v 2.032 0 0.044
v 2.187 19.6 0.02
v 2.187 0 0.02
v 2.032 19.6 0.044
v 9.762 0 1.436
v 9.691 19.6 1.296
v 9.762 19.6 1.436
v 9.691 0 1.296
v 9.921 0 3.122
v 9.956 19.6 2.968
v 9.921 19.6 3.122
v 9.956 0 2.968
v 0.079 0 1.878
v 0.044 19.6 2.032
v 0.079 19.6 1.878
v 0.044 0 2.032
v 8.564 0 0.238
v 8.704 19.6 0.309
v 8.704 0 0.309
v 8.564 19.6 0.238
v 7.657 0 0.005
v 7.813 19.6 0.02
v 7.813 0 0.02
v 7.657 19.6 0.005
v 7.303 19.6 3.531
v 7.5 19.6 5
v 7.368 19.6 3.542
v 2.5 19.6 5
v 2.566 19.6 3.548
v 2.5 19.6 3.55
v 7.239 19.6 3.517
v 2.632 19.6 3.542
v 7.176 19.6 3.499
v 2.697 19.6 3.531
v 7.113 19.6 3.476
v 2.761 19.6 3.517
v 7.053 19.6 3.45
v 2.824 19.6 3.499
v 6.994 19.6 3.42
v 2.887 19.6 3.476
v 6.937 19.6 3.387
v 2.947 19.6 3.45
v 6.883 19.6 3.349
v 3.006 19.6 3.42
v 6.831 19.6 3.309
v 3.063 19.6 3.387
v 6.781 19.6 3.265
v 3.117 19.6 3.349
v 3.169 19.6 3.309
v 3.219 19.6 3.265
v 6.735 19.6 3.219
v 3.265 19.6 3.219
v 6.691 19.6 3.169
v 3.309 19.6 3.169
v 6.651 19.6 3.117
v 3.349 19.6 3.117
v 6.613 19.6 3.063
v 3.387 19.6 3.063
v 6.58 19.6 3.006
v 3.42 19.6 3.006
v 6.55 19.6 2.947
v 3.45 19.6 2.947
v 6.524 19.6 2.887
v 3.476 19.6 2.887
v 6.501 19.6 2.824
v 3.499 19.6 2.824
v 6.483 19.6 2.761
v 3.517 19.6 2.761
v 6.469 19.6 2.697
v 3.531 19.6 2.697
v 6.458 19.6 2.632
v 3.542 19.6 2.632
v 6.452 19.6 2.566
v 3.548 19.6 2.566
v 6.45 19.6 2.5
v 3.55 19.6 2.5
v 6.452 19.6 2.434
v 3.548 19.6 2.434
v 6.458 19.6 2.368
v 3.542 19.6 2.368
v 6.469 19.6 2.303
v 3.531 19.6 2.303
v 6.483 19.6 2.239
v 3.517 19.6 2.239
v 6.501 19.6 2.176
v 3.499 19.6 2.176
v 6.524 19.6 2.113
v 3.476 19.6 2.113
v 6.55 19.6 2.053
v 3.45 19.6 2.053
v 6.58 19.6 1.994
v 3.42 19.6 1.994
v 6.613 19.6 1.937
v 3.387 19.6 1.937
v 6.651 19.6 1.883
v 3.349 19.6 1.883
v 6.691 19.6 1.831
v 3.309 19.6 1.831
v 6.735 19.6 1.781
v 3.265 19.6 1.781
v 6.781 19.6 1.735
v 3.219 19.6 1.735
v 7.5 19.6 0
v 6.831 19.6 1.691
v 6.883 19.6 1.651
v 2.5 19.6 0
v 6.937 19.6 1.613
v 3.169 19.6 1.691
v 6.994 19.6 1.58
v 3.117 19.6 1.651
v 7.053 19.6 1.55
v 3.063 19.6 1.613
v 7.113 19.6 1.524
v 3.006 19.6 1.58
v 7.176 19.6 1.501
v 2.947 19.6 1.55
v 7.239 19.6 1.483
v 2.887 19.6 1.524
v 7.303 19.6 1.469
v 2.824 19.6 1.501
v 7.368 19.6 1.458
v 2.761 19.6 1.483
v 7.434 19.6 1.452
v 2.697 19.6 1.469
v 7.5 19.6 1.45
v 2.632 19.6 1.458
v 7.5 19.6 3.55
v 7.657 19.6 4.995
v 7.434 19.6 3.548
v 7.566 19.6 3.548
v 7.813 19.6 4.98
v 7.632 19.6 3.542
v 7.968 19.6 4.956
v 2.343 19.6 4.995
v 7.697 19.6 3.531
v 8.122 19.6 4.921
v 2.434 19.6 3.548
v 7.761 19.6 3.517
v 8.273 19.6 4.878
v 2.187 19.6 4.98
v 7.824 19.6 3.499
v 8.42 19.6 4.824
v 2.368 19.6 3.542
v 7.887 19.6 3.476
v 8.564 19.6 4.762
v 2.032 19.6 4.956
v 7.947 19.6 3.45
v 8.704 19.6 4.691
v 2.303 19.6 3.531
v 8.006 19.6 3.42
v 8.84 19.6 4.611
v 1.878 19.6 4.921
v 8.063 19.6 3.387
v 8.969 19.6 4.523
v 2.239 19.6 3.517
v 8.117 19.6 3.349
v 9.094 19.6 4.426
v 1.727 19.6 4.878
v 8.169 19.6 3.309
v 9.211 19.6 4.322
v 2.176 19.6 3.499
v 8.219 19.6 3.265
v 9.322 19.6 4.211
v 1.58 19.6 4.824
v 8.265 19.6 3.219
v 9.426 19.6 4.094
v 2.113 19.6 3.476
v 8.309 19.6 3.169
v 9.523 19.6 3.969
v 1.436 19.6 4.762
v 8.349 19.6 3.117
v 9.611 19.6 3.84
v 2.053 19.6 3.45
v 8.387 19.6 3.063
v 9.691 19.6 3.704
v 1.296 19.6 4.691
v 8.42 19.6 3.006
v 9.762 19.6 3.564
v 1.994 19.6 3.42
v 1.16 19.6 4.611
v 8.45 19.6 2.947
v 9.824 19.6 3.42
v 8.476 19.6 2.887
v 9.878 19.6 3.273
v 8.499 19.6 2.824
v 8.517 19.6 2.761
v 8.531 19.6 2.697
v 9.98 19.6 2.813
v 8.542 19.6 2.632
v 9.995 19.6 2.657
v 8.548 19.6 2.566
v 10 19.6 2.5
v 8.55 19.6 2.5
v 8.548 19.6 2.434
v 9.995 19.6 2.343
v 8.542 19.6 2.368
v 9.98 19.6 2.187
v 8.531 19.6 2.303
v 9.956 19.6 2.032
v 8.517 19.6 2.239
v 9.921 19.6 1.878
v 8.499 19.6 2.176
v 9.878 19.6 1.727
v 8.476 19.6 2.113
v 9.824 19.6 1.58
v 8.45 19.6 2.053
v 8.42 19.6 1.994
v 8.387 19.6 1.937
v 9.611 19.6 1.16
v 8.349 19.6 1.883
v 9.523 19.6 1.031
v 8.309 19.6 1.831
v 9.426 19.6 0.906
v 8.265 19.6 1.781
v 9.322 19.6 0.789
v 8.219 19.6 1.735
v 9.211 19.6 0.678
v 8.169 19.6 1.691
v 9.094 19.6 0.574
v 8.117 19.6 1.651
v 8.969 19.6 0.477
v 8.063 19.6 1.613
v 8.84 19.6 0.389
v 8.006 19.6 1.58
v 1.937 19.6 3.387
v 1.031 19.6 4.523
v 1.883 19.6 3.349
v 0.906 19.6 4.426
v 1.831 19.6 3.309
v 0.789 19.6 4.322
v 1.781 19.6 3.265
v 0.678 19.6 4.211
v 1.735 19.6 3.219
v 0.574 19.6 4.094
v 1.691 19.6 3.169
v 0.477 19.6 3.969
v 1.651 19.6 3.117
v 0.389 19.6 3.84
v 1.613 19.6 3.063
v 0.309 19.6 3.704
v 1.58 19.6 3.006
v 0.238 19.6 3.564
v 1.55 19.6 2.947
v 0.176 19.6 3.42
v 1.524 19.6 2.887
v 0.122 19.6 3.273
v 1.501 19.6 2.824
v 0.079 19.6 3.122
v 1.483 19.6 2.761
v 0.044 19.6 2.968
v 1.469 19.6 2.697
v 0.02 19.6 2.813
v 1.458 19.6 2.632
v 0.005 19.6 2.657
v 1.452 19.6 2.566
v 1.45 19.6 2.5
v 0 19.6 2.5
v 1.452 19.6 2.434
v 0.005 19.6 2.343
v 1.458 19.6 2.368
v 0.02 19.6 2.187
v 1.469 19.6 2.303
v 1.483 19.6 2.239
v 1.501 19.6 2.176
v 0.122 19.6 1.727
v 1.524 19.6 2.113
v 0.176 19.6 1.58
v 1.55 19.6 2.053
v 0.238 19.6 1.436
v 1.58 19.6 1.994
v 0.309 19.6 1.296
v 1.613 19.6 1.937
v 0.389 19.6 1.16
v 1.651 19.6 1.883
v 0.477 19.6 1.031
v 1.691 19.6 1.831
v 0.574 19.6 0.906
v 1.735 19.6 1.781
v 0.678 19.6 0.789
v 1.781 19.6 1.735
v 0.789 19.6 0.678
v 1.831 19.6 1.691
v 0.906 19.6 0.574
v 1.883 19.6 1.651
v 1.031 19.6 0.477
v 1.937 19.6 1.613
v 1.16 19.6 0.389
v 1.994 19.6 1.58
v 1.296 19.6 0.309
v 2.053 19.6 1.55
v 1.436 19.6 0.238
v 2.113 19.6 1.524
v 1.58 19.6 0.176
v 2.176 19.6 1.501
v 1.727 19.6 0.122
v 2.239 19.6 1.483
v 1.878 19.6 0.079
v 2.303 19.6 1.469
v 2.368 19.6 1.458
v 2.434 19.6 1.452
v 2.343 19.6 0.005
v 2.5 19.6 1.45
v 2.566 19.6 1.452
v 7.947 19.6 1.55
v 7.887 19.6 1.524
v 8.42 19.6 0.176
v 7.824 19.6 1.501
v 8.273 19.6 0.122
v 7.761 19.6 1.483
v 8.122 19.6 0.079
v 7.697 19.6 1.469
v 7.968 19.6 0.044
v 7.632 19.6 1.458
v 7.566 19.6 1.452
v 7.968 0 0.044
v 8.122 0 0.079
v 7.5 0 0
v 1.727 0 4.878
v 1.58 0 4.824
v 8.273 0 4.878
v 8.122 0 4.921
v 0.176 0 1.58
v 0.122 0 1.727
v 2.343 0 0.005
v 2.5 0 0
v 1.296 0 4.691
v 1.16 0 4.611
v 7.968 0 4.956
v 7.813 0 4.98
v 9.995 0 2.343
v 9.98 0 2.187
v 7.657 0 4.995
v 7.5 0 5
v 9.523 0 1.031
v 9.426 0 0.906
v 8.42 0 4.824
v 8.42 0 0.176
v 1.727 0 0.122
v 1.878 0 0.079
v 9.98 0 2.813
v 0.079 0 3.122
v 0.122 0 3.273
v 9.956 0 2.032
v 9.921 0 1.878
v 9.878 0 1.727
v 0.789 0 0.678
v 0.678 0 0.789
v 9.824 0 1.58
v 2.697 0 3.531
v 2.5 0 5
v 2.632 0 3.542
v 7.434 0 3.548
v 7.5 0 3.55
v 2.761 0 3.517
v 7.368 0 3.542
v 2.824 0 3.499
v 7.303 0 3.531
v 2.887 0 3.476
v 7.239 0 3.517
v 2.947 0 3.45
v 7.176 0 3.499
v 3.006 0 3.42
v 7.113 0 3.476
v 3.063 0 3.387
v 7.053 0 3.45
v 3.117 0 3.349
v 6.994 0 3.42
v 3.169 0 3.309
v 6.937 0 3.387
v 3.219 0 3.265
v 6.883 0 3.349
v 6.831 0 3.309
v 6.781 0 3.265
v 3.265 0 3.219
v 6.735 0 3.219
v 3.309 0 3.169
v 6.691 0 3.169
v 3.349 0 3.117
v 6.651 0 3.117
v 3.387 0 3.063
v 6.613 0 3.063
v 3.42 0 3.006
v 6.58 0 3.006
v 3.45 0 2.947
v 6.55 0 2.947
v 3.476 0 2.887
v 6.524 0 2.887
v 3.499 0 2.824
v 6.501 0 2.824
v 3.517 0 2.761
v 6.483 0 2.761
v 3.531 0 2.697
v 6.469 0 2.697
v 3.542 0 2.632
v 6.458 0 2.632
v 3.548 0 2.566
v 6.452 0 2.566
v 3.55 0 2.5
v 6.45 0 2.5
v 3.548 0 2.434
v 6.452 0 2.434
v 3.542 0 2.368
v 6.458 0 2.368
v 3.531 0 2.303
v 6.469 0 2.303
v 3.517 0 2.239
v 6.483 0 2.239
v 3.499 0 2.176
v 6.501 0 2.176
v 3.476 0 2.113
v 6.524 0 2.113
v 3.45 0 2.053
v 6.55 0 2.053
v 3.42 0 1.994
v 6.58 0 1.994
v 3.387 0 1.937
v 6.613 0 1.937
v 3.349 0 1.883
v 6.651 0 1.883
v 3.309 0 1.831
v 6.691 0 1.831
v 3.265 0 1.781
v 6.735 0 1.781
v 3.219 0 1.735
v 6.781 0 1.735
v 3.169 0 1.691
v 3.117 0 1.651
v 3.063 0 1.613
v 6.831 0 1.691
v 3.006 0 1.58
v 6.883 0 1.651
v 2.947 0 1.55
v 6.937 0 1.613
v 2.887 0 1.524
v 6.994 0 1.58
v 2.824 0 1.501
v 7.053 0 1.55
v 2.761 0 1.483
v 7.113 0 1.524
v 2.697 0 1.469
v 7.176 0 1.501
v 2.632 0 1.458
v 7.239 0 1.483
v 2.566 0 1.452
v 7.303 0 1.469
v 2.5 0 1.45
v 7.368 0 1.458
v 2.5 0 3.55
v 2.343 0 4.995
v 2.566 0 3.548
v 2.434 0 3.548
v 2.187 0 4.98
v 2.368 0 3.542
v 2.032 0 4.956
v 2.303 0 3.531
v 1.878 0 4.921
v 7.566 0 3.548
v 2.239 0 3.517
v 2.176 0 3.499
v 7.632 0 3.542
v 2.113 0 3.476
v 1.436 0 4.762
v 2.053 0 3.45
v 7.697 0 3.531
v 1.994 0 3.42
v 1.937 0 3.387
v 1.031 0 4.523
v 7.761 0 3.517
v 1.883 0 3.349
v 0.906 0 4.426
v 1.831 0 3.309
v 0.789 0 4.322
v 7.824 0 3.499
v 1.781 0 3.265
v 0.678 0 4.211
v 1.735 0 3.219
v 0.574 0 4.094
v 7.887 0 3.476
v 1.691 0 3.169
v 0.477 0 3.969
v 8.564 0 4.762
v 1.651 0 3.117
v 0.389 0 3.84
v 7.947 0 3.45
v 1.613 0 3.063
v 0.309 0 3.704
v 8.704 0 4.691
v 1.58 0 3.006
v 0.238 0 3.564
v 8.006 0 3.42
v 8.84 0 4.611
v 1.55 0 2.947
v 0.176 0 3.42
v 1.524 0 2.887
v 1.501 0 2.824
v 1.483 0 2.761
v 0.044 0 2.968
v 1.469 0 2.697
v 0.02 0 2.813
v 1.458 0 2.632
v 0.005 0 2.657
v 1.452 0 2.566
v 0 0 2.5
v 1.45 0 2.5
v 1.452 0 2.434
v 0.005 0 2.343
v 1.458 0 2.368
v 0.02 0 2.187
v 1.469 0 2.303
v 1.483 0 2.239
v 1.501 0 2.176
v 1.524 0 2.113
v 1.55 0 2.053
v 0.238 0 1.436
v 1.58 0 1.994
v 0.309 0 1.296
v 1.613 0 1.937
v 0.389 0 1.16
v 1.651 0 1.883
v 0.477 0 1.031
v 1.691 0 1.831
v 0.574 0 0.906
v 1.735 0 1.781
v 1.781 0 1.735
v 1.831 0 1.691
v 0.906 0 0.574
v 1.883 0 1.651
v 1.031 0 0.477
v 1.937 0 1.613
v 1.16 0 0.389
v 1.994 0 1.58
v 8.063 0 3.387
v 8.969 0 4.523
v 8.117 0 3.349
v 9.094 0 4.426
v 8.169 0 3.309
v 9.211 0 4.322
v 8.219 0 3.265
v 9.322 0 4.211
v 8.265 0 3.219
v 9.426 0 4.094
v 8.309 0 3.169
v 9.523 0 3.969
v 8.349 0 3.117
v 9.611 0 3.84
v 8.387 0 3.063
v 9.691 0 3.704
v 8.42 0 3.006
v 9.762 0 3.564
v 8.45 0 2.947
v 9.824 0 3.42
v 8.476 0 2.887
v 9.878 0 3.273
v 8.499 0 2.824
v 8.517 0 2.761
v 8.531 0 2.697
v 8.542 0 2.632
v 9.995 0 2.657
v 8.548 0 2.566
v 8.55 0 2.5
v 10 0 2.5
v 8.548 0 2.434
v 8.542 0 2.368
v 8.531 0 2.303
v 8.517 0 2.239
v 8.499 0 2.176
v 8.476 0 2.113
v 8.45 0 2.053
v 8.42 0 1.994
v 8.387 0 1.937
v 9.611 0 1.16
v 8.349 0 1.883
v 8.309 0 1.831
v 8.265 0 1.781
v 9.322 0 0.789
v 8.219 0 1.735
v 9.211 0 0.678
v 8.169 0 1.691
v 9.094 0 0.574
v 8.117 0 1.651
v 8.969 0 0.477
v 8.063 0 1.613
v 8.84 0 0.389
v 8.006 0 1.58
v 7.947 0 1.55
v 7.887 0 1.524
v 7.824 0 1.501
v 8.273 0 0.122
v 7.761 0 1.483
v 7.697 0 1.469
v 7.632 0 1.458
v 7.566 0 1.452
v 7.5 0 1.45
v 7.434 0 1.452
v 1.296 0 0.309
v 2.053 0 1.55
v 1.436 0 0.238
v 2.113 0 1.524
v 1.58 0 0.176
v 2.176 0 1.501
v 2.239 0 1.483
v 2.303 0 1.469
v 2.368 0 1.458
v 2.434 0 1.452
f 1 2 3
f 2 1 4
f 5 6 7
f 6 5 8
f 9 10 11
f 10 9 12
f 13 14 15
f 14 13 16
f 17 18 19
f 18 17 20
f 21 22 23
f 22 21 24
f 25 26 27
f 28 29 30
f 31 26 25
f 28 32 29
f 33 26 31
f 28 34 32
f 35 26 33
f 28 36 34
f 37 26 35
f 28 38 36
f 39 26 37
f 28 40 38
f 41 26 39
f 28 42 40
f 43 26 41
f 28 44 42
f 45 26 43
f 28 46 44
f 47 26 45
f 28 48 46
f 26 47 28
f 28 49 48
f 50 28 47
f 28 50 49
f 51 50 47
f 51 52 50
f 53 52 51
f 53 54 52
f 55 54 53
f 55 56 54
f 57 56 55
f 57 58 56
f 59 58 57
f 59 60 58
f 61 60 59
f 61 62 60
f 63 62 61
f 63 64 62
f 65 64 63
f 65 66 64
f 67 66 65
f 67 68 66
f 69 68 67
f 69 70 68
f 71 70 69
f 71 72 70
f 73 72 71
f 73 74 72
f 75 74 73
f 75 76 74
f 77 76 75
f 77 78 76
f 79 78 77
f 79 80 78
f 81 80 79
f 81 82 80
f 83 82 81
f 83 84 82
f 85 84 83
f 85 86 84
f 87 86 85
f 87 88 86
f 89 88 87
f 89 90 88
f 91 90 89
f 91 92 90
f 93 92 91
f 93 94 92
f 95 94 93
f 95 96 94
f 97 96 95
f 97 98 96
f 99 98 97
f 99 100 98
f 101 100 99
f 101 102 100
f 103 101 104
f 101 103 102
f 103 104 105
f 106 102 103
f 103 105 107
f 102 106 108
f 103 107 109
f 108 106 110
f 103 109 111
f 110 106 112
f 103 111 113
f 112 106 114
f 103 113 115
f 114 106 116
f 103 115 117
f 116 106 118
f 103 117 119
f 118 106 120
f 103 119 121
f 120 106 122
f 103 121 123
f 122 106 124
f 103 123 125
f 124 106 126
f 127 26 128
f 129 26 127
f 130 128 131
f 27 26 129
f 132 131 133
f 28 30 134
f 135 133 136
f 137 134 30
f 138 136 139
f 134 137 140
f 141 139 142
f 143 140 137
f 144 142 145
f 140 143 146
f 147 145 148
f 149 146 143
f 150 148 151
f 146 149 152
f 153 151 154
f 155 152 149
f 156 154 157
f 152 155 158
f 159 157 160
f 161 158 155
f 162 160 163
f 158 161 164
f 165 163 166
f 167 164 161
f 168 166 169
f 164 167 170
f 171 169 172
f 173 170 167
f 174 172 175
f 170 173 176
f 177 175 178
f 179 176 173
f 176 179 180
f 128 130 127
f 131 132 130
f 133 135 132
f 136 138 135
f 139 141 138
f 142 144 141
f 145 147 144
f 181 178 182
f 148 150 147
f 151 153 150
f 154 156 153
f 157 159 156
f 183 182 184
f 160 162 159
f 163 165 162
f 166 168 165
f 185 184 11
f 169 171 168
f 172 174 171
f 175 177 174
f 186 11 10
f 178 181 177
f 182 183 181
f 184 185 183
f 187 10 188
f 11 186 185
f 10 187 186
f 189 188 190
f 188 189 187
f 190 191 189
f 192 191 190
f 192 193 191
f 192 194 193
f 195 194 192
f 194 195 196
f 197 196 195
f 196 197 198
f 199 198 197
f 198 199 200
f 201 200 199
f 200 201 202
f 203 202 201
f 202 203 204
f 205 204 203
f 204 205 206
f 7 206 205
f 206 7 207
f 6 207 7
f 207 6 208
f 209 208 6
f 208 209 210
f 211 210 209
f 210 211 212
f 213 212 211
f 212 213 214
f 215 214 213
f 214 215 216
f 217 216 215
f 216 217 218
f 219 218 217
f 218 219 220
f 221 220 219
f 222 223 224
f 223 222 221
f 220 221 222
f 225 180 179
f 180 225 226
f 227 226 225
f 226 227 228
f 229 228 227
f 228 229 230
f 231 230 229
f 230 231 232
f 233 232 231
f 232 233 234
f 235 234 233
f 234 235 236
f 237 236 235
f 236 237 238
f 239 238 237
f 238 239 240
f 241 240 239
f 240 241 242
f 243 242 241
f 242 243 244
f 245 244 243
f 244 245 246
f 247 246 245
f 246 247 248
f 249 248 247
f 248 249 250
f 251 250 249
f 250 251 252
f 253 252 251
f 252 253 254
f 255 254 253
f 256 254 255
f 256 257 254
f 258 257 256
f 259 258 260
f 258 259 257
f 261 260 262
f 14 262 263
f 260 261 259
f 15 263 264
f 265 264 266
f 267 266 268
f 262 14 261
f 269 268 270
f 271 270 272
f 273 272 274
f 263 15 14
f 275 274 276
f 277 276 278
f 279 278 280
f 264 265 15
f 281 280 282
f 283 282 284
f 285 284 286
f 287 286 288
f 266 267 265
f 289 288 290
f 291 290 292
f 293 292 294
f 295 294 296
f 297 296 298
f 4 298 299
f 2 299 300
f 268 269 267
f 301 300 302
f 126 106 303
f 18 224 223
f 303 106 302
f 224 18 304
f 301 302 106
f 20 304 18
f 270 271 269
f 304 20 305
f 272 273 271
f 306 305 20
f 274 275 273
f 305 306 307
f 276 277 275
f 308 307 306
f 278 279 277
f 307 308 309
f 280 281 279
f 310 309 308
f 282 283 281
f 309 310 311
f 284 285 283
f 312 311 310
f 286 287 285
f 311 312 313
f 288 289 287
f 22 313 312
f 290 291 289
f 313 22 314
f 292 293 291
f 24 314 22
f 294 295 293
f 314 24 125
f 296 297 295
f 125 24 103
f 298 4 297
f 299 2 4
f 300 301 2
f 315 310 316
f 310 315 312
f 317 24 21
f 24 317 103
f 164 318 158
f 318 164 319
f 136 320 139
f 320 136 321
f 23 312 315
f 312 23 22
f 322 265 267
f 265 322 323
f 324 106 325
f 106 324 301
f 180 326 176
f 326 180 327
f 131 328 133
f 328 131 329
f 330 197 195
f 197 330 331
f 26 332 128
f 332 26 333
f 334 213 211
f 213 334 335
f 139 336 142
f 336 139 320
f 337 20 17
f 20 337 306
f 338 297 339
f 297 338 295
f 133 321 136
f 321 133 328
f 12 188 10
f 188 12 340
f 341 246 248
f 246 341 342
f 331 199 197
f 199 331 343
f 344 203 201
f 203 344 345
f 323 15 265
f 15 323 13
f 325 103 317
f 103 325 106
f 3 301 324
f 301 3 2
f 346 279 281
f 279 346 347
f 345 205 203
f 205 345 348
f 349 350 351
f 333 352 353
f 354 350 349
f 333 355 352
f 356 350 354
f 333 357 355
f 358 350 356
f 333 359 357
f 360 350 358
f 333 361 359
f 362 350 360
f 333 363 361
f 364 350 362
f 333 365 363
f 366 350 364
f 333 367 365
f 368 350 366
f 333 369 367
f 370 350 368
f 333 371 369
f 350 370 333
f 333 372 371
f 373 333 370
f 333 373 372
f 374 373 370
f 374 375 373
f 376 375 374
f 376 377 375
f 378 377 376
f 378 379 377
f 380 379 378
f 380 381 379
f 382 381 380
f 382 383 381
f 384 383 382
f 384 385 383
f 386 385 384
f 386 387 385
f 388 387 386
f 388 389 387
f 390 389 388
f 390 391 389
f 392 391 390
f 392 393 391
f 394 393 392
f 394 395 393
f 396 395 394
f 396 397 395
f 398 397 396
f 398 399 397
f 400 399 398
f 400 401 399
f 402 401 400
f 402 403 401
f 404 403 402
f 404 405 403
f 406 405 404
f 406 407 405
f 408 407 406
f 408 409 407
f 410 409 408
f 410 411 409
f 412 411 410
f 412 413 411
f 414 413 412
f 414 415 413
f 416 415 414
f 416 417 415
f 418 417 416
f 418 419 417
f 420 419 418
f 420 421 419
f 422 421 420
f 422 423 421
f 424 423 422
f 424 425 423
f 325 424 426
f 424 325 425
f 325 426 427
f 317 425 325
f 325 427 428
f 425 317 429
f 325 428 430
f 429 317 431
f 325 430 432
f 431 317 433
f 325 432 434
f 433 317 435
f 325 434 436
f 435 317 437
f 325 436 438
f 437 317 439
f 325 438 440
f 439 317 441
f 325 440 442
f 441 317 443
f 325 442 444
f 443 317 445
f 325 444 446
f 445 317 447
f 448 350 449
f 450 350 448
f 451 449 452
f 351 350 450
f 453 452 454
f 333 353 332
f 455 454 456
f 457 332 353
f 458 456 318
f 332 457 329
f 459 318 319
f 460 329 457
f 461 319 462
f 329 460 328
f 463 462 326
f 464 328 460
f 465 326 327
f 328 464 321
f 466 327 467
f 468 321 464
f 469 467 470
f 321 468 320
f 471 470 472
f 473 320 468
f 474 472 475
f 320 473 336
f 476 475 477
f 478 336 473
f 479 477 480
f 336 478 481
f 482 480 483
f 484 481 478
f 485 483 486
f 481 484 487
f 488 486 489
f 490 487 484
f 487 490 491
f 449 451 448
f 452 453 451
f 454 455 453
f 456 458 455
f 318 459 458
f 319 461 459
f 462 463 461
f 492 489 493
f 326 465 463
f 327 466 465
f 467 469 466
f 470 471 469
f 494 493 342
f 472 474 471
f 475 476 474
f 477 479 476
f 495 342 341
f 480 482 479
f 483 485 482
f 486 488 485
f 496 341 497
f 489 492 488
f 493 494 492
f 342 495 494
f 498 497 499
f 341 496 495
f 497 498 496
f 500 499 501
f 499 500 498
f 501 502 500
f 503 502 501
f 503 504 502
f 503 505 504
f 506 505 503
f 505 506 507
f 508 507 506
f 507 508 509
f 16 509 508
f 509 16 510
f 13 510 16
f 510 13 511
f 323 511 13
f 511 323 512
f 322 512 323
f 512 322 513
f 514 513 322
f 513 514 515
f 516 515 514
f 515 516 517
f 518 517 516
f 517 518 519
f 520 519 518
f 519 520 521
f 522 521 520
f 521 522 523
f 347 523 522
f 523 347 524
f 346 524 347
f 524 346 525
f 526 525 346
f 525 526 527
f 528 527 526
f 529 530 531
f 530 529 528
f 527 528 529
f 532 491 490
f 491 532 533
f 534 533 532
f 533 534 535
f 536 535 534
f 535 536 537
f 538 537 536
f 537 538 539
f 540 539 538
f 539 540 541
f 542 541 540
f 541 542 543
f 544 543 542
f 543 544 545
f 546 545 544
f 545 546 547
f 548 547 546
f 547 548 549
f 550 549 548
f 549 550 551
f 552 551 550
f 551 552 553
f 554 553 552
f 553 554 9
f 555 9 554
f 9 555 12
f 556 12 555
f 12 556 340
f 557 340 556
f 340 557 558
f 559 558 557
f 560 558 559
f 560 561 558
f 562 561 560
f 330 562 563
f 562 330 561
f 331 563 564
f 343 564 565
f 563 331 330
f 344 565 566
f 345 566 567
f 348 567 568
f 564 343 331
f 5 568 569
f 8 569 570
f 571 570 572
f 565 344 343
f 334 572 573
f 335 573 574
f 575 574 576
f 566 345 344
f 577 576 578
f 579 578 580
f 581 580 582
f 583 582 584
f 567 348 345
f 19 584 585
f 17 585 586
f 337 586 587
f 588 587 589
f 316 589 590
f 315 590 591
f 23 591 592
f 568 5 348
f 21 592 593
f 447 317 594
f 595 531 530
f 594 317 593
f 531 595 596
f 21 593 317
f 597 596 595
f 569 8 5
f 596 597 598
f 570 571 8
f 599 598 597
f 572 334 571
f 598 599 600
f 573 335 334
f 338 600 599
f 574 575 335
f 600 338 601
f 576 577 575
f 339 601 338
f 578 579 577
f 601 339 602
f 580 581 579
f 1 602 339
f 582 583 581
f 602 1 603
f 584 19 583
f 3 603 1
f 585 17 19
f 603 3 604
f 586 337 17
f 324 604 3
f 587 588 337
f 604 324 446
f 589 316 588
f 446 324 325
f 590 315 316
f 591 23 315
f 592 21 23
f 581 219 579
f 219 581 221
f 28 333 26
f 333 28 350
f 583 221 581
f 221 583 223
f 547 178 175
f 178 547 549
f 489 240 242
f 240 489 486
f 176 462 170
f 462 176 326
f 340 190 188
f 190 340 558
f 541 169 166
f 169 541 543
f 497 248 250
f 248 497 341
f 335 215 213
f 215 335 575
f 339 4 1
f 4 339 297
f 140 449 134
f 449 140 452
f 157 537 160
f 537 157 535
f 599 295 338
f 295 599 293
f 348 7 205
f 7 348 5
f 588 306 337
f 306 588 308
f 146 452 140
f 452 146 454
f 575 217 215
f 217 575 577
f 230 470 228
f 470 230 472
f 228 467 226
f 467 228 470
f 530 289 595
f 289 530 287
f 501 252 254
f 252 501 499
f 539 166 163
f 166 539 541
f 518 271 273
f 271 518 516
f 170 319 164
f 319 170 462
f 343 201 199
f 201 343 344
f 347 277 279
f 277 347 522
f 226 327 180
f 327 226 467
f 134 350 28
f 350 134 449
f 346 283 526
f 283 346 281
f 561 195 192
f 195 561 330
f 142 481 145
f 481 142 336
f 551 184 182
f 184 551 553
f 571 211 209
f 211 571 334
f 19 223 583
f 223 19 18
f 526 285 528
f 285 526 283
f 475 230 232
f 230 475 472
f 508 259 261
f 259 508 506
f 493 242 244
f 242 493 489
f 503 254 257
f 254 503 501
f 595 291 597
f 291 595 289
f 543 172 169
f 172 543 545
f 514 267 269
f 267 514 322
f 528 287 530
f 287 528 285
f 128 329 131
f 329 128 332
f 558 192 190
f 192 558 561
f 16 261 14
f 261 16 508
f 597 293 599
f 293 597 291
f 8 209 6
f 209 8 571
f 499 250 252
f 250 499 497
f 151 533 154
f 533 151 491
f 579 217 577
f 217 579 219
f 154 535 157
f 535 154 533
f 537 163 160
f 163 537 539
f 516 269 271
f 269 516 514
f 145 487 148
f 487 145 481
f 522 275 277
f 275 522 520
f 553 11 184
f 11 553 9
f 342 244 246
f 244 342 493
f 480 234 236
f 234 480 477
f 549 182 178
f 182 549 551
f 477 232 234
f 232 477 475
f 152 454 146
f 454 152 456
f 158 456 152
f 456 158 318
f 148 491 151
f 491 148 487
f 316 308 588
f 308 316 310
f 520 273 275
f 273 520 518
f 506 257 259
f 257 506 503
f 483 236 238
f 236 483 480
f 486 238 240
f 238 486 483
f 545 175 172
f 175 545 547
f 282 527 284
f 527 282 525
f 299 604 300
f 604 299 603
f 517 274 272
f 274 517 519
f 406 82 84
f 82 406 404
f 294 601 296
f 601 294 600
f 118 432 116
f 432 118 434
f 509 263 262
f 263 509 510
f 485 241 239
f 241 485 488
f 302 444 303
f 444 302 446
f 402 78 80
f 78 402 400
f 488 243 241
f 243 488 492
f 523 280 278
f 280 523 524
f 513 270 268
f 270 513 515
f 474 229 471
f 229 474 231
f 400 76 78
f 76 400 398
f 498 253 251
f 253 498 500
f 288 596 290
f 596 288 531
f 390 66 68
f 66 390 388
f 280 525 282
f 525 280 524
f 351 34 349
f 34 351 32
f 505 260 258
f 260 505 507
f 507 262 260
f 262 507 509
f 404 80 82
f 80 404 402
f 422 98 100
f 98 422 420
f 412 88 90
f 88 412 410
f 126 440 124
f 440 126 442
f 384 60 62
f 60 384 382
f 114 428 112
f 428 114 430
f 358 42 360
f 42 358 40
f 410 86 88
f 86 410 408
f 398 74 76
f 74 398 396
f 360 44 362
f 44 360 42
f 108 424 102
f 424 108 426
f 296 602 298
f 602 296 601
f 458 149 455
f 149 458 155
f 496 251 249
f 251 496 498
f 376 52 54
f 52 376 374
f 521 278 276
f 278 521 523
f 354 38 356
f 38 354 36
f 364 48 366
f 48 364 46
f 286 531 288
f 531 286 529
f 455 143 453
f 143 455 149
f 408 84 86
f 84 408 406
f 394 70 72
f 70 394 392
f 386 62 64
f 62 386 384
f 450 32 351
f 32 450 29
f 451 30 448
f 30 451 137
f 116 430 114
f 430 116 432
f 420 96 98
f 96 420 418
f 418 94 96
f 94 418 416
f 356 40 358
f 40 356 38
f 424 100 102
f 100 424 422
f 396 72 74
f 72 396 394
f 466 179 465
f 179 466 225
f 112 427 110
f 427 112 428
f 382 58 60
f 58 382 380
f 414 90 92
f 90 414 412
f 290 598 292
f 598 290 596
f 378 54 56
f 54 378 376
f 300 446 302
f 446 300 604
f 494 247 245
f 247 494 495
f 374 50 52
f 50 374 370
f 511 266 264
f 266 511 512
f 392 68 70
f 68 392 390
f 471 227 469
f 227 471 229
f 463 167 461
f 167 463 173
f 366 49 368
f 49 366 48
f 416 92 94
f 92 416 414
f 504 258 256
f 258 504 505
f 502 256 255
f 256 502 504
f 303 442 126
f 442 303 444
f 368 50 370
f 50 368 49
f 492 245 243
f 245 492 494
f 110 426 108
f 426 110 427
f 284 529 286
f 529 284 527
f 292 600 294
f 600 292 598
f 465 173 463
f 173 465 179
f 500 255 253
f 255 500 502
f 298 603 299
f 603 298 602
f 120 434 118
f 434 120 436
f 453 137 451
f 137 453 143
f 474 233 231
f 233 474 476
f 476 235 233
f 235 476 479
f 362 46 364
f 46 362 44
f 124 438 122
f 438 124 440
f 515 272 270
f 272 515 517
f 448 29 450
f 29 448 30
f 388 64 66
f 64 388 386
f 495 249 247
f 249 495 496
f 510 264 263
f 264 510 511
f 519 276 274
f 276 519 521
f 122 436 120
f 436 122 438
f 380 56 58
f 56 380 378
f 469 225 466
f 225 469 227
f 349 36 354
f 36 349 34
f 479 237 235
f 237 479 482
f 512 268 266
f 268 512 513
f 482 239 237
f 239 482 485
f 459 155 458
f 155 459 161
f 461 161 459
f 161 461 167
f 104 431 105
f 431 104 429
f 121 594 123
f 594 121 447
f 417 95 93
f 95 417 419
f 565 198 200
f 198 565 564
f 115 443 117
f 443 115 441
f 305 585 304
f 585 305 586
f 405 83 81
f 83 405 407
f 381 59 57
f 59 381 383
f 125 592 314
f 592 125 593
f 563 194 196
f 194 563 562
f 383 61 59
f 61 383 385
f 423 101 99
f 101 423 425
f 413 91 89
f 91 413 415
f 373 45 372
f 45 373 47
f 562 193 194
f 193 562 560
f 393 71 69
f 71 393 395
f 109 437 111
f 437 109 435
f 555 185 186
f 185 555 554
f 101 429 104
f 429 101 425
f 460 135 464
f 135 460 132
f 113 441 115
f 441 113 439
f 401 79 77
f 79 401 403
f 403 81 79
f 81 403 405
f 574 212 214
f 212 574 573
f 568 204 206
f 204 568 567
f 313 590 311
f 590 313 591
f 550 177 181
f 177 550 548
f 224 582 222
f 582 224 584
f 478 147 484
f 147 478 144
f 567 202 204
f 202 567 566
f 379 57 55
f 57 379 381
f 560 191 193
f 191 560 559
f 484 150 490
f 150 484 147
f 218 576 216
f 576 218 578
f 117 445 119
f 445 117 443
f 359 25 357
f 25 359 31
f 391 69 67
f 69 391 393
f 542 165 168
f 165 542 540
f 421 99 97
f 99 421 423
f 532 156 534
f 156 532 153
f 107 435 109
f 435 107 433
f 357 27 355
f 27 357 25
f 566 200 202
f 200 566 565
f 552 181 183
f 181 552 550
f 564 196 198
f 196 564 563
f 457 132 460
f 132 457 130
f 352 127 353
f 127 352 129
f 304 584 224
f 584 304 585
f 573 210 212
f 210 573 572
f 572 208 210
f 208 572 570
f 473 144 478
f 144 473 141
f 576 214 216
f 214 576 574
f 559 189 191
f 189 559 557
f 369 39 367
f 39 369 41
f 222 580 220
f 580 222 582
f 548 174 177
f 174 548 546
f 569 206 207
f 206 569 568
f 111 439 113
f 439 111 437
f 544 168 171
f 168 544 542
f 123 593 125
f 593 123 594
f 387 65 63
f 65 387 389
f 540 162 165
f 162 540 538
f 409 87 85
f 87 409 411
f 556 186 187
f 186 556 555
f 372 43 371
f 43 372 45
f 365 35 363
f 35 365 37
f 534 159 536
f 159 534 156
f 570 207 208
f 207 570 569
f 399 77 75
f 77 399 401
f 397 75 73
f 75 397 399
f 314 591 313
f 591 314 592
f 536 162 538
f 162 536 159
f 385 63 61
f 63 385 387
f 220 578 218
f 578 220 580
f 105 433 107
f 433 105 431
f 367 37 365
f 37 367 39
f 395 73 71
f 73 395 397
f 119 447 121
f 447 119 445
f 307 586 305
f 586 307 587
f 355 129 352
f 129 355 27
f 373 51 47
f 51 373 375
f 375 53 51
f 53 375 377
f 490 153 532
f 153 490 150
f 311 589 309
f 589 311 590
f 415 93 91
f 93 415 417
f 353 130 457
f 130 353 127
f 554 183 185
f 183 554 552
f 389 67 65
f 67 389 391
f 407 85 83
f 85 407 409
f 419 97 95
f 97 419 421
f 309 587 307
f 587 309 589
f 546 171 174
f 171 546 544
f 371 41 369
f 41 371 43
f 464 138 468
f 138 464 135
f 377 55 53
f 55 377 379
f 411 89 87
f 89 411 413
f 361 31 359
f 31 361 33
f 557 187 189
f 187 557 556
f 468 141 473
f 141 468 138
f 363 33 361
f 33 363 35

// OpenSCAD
/* UNCOMMENT EACH MODEL TO RENDER THEM SEPARATELY */
//midScreen();
//endScreen();
hinge();

/* BEGIN CODE */

/************/
// This is the adjust the hole size you will put the filament through
// change this to adjust the tolerance
// 2.1 worked for me for 1.75mm filament
filamentD=2.1;
/************/

$fn=100;
width=148;
height=210;
thickness=5;
hingeGapHeight=20;
hingeHeight=19.6; // is a multiple of 0.4 for the stand nozzle size
filamentLength=hingeGapHeight+thickness*4;


module filament() {
    rotate([-90,0,0])
    translate([thickness*0.5,-thickness*0.5,0])
    cylinder(d=filamentD, h=filamentLength);
}

module screen() {
    difference() {
        cube([width,height,thickness]);
        
        translate([thickness,thickness,thickness/2])
        cube([width-thickness*2,height-thickness*2,thickness]);
    }
}

module hinge() {
    difference() {
        rotate([-90,0,0])
        translate([0,-thickness,0])
        hull() {
            translate([thickness/2,thickness/2,0])
                cylinder(h=hingeHeight, d=thickness);
            
            
            translate([thickness*1.5,thickness/2,0])
                cylinder(h=hingeHeight, d=thickness);
        }
        
        filament();
        
        translate([thickness,0,0])
        filament();
    }
}

module hingeGap() {
    cube([thickness*2, hingeGapHeight, thickness]);
}

module doubleHingeGap() {
    translate([-thickness,thickness*2,0])
    hingeGap();

    translate([-thickness,height-thickness*2-hingeGapHeight,0])
    hingeGap();
}

module doubleFilamentGap() {
    filament();
    
    translate([0,height-filamentLength,0])
    filament();
}

module endScreen() {
    difference() {
        screen();
        
        doubleHingeGap();
        
        doubleFilamentGap();
    }
}

module midScreen() {
    difference() {
        screen();
 
        doubleHingeGap();
        
        translate([width,0,0])
        doubleHingeGap();

        doubleFilamentGap();
        
        translate([width-thickness,0,0])
        doubleFilamentGap();
    }
}
